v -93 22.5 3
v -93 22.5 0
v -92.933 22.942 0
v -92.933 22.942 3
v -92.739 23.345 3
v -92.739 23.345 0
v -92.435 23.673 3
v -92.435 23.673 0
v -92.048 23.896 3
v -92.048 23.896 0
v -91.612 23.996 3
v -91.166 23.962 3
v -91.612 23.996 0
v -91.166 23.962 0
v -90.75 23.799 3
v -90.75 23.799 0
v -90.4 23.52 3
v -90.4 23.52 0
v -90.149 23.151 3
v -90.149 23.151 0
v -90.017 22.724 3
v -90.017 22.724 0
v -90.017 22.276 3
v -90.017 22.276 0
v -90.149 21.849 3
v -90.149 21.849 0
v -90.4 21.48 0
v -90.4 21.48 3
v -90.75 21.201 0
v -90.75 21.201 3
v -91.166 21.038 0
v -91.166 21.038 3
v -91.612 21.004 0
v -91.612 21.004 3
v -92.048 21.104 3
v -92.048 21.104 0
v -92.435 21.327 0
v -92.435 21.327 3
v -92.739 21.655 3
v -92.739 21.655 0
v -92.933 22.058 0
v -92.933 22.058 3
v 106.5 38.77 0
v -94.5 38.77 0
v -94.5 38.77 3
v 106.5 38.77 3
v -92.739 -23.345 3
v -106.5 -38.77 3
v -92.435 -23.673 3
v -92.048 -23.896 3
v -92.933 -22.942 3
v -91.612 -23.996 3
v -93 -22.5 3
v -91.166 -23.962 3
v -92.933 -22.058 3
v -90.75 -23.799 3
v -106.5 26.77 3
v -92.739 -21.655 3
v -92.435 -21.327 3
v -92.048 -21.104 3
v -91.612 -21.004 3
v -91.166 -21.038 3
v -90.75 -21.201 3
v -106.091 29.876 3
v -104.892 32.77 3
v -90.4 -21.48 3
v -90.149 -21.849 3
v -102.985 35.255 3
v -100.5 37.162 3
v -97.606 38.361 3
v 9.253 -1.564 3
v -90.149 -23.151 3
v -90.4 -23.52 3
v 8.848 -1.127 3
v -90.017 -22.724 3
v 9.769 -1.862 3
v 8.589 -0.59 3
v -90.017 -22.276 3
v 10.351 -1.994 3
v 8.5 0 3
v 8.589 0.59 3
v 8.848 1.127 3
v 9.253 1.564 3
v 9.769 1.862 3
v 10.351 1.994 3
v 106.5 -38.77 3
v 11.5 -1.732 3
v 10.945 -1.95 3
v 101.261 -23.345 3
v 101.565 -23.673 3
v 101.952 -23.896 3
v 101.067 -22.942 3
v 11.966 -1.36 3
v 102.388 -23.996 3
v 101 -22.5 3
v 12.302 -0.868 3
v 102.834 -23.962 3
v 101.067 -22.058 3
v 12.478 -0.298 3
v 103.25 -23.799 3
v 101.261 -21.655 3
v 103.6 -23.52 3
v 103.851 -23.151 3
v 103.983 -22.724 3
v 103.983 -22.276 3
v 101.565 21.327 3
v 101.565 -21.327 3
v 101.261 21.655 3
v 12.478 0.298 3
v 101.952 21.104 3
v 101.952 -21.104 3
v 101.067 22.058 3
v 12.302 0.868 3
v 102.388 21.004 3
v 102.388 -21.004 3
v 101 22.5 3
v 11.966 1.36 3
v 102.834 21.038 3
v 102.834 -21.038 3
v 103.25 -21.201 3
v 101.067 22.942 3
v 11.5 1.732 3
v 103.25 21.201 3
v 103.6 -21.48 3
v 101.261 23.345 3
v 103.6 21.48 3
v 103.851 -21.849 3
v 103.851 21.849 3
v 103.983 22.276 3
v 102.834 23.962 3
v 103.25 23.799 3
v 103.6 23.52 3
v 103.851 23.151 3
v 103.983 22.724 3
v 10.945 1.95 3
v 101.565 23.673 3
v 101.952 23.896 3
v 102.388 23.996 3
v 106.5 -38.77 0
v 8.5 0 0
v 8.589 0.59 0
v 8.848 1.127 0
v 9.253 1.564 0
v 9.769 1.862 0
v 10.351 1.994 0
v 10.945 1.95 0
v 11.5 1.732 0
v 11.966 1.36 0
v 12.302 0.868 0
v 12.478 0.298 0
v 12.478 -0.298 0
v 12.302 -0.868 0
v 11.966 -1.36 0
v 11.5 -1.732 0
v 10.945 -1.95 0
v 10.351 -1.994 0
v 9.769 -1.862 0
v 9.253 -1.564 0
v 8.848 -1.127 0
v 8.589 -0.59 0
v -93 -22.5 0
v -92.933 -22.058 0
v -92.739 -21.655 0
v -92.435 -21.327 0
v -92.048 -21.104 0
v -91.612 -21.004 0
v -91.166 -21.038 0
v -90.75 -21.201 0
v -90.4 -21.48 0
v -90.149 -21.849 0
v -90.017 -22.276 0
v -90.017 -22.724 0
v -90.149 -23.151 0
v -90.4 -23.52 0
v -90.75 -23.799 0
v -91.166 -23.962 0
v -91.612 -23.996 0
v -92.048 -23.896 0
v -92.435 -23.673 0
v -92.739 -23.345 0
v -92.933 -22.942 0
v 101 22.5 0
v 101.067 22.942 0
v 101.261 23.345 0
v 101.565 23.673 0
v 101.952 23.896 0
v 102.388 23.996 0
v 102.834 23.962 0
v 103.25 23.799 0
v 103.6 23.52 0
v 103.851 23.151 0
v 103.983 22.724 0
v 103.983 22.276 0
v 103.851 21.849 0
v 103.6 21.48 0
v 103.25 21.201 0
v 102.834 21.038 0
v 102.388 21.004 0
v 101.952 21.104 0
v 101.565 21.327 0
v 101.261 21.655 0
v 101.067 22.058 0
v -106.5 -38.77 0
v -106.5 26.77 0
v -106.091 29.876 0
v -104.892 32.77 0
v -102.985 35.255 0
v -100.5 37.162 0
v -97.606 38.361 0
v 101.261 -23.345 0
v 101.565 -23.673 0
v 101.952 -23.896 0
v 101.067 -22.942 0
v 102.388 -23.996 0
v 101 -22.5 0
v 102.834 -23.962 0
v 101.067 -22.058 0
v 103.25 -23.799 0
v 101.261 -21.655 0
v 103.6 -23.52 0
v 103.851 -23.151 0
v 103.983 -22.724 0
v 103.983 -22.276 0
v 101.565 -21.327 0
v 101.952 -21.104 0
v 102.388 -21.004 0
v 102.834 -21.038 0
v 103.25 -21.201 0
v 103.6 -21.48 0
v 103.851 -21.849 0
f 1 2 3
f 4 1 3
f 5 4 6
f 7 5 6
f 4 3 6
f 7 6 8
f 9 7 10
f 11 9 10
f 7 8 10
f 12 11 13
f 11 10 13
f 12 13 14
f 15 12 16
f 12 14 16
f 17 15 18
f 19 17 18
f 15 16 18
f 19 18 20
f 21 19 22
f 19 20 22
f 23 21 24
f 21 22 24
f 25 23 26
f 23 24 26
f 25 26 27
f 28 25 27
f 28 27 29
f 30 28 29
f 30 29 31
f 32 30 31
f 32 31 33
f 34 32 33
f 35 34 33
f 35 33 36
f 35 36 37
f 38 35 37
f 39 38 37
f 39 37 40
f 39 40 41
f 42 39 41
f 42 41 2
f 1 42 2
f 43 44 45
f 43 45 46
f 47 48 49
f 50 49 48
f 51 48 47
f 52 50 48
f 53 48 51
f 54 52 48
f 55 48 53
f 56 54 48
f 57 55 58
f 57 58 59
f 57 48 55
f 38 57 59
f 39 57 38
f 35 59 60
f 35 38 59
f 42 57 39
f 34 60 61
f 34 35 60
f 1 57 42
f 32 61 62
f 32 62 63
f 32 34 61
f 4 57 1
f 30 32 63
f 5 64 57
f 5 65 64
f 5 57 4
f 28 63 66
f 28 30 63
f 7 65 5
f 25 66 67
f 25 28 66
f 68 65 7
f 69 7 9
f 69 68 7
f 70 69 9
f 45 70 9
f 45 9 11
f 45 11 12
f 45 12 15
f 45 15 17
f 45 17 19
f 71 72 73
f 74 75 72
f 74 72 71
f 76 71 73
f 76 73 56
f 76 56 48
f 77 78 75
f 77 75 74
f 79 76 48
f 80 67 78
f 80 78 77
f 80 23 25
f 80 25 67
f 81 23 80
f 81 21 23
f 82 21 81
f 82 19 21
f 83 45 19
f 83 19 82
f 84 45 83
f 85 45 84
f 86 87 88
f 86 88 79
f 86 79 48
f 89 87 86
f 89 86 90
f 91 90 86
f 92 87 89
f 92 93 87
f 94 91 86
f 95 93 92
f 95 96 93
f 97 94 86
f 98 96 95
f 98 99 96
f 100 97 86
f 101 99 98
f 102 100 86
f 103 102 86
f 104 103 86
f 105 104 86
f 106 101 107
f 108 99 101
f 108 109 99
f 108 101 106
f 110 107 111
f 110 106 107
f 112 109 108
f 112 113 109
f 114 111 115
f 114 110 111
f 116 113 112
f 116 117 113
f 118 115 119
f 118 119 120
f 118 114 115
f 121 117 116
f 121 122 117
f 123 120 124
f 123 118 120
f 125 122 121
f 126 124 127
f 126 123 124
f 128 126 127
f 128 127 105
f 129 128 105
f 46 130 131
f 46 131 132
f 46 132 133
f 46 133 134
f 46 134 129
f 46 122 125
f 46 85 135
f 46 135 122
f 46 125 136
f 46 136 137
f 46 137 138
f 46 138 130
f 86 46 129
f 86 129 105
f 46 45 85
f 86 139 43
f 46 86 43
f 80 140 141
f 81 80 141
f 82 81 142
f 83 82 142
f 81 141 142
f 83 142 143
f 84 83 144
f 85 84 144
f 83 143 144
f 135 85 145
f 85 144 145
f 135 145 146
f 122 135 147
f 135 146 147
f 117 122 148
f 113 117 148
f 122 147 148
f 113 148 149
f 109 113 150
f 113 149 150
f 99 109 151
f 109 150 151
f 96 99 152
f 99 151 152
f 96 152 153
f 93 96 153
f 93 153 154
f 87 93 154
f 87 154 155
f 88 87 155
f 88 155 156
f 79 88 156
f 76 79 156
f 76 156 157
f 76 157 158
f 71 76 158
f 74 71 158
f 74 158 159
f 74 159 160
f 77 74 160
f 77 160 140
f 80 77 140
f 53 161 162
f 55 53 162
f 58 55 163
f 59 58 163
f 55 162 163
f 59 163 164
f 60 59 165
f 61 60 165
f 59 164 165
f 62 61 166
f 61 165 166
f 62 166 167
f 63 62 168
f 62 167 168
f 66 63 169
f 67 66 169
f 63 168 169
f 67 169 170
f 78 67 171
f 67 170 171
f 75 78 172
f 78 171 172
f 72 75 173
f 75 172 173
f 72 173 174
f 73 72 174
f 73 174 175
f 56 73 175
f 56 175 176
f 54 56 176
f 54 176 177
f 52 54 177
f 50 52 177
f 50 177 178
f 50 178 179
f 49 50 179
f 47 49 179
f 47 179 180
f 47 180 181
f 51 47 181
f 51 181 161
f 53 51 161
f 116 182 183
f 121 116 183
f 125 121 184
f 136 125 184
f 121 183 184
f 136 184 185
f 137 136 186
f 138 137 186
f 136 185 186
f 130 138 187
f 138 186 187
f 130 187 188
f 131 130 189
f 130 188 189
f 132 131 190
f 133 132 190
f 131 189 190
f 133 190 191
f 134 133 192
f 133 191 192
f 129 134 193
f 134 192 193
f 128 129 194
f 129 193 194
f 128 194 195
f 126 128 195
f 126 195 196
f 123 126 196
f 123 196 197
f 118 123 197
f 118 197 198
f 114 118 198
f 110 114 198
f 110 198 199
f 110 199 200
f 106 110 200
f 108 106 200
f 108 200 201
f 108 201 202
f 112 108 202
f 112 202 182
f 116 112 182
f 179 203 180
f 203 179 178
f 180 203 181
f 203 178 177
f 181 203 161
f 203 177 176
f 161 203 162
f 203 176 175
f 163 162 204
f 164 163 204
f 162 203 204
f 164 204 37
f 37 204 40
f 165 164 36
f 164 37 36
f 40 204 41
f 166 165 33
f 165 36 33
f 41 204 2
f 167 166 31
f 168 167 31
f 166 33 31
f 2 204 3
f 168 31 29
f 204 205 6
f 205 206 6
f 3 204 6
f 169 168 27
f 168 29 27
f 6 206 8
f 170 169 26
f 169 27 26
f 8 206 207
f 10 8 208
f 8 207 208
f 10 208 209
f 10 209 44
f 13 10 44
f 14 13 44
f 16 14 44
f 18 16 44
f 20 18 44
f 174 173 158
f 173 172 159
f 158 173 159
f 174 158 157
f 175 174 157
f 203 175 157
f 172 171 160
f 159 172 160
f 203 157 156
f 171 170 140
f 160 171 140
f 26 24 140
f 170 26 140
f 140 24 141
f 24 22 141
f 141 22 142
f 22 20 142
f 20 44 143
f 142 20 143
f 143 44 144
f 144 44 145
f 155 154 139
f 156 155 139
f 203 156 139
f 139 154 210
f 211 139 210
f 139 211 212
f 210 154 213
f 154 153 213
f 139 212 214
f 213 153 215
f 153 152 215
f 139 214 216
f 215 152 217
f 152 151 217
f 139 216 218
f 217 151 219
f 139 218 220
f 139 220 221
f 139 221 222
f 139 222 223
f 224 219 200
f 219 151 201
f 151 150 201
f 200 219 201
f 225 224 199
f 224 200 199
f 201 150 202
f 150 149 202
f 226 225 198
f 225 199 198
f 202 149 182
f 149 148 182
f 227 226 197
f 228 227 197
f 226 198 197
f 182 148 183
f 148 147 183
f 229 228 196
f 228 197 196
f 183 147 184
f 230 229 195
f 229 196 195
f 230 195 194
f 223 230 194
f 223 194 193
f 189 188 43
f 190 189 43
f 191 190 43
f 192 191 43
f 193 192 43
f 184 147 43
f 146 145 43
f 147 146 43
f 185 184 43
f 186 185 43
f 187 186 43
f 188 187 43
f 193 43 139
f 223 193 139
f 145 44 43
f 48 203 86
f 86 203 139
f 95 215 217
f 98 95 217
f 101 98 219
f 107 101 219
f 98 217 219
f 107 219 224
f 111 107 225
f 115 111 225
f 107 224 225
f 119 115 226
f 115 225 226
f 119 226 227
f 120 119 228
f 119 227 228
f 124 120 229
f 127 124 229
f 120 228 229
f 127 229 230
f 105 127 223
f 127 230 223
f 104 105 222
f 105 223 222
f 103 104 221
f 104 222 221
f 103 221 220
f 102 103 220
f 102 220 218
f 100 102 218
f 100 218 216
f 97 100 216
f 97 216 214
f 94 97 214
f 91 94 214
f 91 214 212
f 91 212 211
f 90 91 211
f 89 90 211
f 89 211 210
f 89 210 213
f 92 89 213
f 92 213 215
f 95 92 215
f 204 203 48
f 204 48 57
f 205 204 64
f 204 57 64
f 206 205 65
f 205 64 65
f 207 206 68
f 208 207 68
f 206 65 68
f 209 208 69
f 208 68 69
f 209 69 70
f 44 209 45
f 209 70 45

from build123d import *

# Parameters (mm, degrees)
SKETCH1_W           = 213
SKETCH1_H           = 77.54
BOSS_EXTRUDE1_DEPTH = 3
FILLET2_R           = 12
CUT_EXTRUDE1_REACH  = 115.377
SKETCH2_R           = 2
CUT_EXTRUDE2_REACH  = 115.377
SKETCH3_R           = 1.5
CUT_EXTRUDE3_REACH  = 115.377
SKETCH4_R           = 1.5


with BuildPart() as part:
    # Sketch1 → Boss-Extrude1 (new body)
    with BuildSketch(Plane.XY):
        Rectangle(SKETCH1_W, SKETCH1_H)
    extrude(amount=BOSS_EXTRUDE1_DEPTH)

    # Fillet2
    fillet2_edges = [part.edges().sort_by_distance(p)[0] for p in [
        (-106.5, 38.77, 1.5),
    ]]
    fillet(fillet2_edges, radius=FILLET2_R)

    # Sketch2 → Cut-Extrude1 (cut, up to next)
    with BuildSketch(Plane(origin=(0, 0, 0), x_dir=(-1, 0, 0), z_dir=(0, 0, -1)), mode=Mode.PRIVATE) as cut_extrude1_sk1:
        with Locations((-10.5, 0)):
            Circle(SKETCH2_R)
    cut_extrude1_tool1 = extrude(cut_extrude1_sk1.sketch, amount=-CUT_EXTRUDE1_REACH, mode=Mode.PRIVATE) & part.part
    add(cut_extrude1_tool1.solids().sort_by_distance((10.5, 0, 0))[0], mode=Mode.SUBTRACT)

    # Sketch3 → Cut-Extrude2 (cut, up to next)
    with BuildSketch(Plane(origin=(0, 0, 0), x_dir=(-1, 0, 0), z_dir=(0, 0, -1)), mode=Mode.PRIVATE) as cut_extrude2_sk1:
        with Locations((-102.5, 22.5)):
            Circle(SKETCH3_R)
    cut_extrude2_tool1 = extrude(cut_extrude2_sk1.sketch, amount=-CUT_EXTRUDE2_REACH, mode=Mode.PRIVATE) & part.part
    # Sketch3 → Cut-Extrude2 (cut, up to next)
    with BuildSketch(Plane(origin=(0, 0, 0), x_dir=(-1, 0, 0), z_dir=(0, 0, -1)), mode=Mode.PRIVATE) as cut_extrude2_sk2:
        with Locations((-102.5, -22.5)):
            Circle(SKETCH3_R)
    cut_extrude2_tool2 = extrude(cut_extrude2_sk2.sketch, amount=-CUT_EXTRUDE2_REACH, mode=Mode.PRIVATE) & part.part
    add(cut_extrude2_tool1.solids().sort_by_distance((102.5, 22.5, 0))[0], mode=Mode.SUBTRACT)
    add(cut_extrude2_tool2.solids().sort_by_distance((102.5, -22.5, 0))[0], mode=Mode.SUBTRACT)

    # Sketch4 → Cut-Extrude3 (cut, up to next)
    with BuildSketch(Plane(origin=(0, 0, 0), x_dir=(-1, 0, 0), z_dir=(0, 0, -1)), mode=Mode.PRIVATE) as cut_extrude3_sk1:
        with Locations((91.5, 22.5)):
            Circle(SKETCH4_R)
    cut_extrude3_tool1 = extrude(cut_extrude3_sk1.sketch, amount=-CUT_EXTRUDE3_REACH, mode=Mode.PRIVATE) & part.part
    # Sketch4 → Cut-Extrude3 (cut, up to next)
    with BuildSketch(Plane(origin=(0, 0, 0), x_dir=(-1, 0, 0), z_dir=(0, 0, -1)), mode=Mode.PRIVATE) as cut_extrude3_sk2:
        with Locations((91.5, -22.5)):
            Circle(SKETCH4_R)
    cut_extrude3_tool2 = extrude(cut_extrude3_sk2.sketch, amount=-CUT_EXTRUDE3_REACH, mode=Mode.PRIVATE) & part.part
    add(cut_extrude3_tool1.solids().sort_by_distance((-91.5, 22.5, 0))[0], mode=Mode.SUBTRACT)
    add(cut_extrude3_tool2.solids().sort_by_distance((-91.5, -22.5, 0))[0], mode=Mode.SUBTRACT)


solid = part.part
